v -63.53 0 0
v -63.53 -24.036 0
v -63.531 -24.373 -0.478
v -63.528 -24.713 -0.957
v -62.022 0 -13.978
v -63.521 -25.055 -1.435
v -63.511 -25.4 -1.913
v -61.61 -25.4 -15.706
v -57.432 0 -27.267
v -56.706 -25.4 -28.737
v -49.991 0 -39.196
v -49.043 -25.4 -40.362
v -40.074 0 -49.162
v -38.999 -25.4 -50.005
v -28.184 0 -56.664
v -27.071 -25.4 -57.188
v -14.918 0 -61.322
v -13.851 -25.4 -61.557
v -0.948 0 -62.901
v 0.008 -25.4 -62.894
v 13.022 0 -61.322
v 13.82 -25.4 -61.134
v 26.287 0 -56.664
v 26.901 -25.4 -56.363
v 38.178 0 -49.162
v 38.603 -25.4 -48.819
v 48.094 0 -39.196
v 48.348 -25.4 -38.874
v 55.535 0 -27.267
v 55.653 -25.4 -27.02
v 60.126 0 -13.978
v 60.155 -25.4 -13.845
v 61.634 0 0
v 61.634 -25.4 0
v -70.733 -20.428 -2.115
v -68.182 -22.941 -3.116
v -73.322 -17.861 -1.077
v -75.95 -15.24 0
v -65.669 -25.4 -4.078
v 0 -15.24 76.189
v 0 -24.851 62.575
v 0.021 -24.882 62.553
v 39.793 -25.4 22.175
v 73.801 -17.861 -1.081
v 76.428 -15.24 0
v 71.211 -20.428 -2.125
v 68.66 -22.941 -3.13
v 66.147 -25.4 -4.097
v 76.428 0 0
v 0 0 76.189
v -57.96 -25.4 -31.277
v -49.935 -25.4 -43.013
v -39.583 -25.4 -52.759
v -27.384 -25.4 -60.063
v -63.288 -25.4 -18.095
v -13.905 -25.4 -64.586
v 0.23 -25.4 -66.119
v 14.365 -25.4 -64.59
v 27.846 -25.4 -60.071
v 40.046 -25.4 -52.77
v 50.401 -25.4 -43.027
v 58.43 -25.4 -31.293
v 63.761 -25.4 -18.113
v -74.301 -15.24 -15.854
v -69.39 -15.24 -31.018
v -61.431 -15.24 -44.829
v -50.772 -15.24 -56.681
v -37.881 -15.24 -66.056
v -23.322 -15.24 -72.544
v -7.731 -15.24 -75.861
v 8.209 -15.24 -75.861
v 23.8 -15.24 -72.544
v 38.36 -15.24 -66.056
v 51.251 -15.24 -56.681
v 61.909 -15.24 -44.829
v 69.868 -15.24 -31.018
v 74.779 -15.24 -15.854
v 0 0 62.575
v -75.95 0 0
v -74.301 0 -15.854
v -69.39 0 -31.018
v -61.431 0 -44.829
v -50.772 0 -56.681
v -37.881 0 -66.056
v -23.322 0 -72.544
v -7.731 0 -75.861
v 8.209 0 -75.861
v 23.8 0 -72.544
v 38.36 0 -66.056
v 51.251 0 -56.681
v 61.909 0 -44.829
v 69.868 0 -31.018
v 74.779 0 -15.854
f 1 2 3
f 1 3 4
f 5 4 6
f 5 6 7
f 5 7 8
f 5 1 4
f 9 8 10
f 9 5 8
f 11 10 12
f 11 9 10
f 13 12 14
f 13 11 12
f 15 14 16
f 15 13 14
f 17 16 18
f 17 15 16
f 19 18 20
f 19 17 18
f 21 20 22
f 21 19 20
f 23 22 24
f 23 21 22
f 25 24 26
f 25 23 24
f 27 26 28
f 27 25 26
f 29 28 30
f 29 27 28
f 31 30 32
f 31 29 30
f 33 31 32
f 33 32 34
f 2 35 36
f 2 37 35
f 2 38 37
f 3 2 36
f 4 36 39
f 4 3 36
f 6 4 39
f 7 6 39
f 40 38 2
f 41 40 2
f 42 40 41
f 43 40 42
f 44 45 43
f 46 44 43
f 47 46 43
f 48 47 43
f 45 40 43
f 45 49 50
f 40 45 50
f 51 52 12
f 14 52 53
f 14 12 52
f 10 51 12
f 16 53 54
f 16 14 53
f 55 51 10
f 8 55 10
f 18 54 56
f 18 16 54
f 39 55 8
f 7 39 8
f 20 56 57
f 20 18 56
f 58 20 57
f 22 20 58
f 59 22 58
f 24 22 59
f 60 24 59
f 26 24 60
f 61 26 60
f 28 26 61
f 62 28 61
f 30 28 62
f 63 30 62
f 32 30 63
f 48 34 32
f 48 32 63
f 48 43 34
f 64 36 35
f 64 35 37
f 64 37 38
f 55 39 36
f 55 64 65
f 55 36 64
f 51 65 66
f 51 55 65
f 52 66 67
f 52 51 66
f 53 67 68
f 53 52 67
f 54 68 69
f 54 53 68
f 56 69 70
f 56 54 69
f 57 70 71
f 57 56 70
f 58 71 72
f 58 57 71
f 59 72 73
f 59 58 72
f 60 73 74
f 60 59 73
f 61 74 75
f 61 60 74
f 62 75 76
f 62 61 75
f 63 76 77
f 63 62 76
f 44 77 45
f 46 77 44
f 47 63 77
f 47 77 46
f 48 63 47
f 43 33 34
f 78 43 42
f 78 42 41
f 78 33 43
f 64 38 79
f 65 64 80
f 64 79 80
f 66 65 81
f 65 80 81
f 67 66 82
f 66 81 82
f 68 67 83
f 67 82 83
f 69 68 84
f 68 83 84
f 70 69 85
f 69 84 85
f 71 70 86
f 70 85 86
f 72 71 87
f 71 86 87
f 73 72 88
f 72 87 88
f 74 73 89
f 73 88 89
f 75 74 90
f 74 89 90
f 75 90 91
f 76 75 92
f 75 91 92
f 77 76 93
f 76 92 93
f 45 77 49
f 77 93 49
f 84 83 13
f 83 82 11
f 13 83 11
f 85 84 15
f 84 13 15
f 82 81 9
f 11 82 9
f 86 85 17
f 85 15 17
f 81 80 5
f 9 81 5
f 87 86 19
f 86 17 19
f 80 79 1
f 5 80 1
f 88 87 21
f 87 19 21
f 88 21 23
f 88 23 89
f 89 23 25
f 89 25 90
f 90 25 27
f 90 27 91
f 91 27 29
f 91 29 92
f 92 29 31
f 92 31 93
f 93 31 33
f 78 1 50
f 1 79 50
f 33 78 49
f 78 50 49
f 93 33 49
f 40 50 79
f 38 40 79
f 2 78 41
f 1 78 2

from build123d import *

# Parameters (mm, degrees)
F1_DEPTH    = 25.4
F3_DEPTH    = 25.4
F4_T1_DEPTH = 159.8348336794
F4_T3_DEPTH = 160.173130017
F4_T6_ANGLE = 219.4963428168


# Not quite as in the source:
# - a fillet or chamfer that OpenCascade refuses, or shapes differently, is made with other operations: its cross-section is extruded or revolved along the edge and cut away or added


with BuildPart() as f1:
    # F0 (on Front) → F1 (new body)
    with BuildSketch(Plane.XZ):
        with BuildLine():
            Line((76.4282107728, 0), (0, 76.1886239052))
            Line((0, 76.1886239052), (-75.9497880936, 0))
            ThreePointArc((-75.9497880936, 0), (0.2392113396, -76.2787980571), (76.4282107728, 0))
        make_face()
    extrude(amount=F1_DEPTH)

    # F2 (on Front) → F3 (cut)
    with BuildSketch(Plane.XZ):
        with BuildLine():
            Line((61.6340054605, 0), (0, 62.5749826431))
            Line((0, 62.5749826431), (-63.5303258896, 0))
            ThreePointArc((-63.5303258896, 0), (-0.9481602145, -62.9010402783), (61.6340054605, 0))
        make_face()
    extrude(amount=F3_DEPTH, mode=Mode.SUBTRACT)

    # F4: chamfer of 10.16 on 3 edges, made by hand

    # F4_s2 → F4_t1 (cut)
    with BuildSketch(Plane(origin=(56.5405950538, 0, 56.7183956672), x_dir=(0, 1, 0), z_dir=(-0.7059958535, 0, -0.7082159662))):
        Polygon((-15.24, -53.7888525608), (-25.4, -43.6288525608), (-25.4, -53.7888525608), align=None)
    extrude(amount=F4_T1_DEPTH, mode=Mode.SUBTRACT)

    # F4_s4 → F4_t3 (cut)
    with BuildSketch(Plane(origin=(56.8385652176, 0, -56.6603878972), x_dir=(0, 1, 0), z_dir=(-0.7082159662, 0, 0.7059958535))):
        Polygon((-15.24, -53.9579998959), (-25.4, -43.7979998959), (-25.4, -53.9579998959), align=None)
    extrude(amount=F4_T3_DEPTH, mode=Mode.SUBTRACT)

    # F4_s5 → F4_t6 (revolve, cut)
    with BuildSketch(Plane(origin=(-0.0012303148, 0, -0.0034270544), x_dir=(0, 1, 0), z_dir=(0.3378866803, 0, 0.9411867994))):
        Polygon((-15.24, 75.9335858363), (-25.4, 65.7735858363), (-25.4, 75.9335858363), align=None)
    revolve(axis=Axis((0.2392113396, -25.4, -0.0897457666), (0, -1, 0)), revolution_arc=F4_T6_ANGLE, mode=Mode.SUBTRACT)


solid = f1.part
